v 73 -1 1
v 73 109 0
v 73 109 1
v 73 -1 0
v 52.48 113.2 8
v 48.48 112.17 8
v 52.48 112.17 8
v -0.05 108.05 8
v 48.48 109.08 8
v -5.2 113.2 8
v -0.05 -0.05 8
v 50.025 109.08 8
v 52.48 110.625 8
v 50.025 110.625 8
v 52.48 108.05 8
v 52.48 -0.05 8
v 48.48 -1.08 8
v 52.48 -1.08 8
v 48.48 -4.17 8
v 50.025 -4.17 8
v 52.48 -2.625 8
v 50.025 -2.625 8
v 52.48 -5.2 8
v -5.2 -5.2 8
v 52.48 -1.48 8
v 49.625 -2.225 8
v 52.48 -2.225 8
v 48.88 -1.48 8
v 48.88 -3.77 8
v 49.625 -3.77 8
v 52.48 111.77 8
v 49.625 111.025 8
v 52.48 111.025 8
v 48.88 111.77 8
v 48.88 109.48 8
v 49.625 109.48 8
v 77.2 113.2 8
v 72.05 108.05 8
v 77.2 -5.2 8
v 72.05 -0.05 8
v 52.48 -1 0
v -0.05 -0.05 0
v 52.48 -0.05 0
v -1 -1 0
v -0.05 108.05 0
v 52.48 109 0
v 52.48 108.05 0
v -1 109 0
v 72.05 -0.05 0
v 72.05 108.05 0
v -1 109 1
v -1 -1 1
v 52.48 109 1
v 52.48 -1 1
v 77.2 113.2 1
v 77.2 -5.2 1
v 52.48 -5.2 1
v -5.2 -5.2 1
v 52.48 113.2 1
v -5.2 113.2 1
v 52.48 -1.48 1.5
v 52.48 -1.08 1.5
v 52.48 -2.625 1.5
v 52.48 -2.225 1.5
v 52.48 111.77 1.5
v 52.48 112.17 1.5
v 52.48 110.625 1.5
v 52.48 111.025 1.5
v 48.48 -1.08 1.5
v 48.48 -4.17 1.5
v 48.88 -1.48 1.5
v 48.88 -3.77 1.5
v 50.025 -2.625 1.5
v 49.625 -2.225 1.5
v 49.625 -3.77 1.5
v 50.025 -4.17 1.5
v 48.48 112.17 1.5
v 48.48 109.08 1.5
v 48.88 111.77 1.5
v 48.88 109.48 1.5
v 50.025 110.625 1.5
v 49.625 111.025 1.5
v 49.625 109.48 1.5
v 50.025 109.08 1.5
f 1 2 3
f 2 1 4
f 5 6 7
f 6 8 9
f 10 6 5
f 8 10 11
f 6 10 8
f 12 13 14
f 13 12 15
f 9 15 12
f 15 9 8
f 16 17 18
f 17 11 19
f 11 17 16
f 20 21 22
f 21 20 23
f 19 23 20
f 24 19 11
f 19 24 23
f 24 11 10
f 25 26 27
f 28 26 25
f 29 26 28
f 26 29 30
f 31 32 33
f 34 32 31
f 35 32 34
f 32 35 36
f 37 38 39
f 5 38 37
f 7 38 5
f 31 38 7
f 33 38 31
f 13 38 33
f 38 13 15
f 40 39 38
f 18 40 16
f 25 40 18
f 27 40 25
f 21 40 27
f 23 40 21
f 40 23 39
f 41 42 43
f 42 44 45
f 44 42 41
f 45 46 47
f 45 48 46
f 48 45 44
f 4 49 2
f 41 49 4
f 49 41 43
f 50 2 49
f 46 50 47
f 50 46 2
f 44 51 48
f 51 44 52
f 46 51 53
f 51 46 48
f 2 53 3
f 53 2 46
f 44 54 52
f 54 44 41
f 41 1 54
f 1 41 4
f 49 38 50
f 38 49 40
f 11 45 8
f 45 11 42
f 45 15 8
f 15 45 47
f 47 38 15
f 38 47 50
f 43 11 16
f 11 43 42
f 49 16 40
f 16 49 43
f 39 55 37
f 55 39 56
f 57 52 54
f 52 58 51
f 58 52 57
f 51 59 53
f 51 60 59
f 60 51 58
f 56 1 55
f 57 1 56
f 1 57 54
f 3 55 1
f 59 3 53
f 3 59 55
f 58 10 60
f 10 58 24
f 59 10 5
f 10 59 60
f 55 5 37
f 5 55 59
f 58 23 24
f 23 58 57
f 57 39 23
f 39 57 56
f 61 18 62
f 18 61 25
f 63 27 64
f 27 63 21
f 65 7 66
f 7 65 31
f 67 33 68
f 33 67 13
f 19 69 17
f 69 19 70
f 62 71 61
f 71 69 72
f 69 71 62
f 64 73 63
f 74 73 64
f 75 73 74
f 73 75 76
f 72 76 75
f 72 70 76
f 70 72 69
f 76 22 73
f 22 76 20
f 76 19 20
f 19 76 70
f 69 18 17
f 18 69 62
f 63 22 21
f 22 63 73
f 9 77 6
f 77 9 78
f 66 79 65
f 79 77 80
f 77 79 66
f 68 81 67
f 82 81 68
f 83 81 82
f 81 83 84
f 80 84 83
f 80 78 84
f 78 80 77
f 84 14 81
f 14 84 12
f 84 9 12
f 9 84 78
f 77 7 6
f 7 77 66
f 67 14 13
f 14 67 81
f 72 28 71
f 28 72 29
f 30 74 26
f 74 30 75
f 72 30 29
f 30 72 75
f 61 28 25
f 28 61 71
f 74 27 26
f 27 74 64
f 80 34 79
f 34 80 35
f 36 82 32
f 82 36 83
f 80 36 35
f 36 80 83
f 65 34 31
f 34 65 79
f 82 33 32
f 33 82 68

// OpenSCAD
// Generated by SolidPython 1.0.4 on 2021-01-27 23:57:26


union() {
	difference() {
		difference() {
			difference() {
				union() {
					difference() {
						translate(v = [-1.0000000000, -1.0000000000, 0]) {
							cube(size = [74.0000000000, 110.0000000000, 8]);
						}
						translate(v = [-0.0500000000, -0.0500000000, 0]) {
							cube(size = [72.1000000000, 108.1000000000, 8]);
						}
					}
					translate(v = [0, 0, 1]) {
						difference() {
							translate(v = [-5.2000000000, -5.2000000000, 0]) {
								cube(size = [82.4000000000, 118.4000000000, 7]);
							}
							translate(v = [-1.0000000000, -1.0000000000, 0]) {
								cube(size = [74.0000000000, 110.0000000000, 7]);
							}
						}
					}
				}
				translate(v = [52.4800000000, -5.2000000000, 0]) {
					cube(size = [24.7200000000, 118.4000000000, 8]);
				}
			}
			translate(v = [48.4800000000, -4.1700000000, 0]) {
				translate(v = [0, 0, 1.5000000000]) {
					translate(v = [4, 3.0900000000, 0]) {
						rotate(a = -180) {
							union() {
								translate(v = [2.4550000000, 0, 0]) {
									cube(size = [1.5450000000, 3.0900000000, 6.5000000000]);
								}
								cube(size = [4, 1.5450000000, 6.5000000000]);
							}
						}
					}
				}
			}
		}
		translate(v = [48.4800000000, 109.0800000000, 0]) {
			translate(v = [0, 0, 1.5000000000]) {
				translate(v = [4, 3.0900000000, 0]) {
					rotate(a = -180) {
						union() {
							translate(v = [2.4550000000, 0, 0]) {
								cube(size = [1.5450000000, 3.0900000000, 6.5000000000]);
							}
							cube(size = [4, 1.5450000000, 6.5000000000]);
						}
					}
				}
			}
		}
	}
	union() {
		union() {
			difference() {
				union() {
					difference() {
						translate(v = [-1.0000000000, -1.0000000000, 0]) {
							cube(size = [74.0000000000, 110.0000000000, 8]);
						}
						translate(v = [-0.0500000000, -0.0500000000, 0]) {
							cube(size = [72.1000000000, 108.1000000000, 8]);
						}
					}
					translate(v = [0, 0, 1]) {
						difference() {
							translate(v = [-5.2000000000, -5.2000000000, 0]) {
								cube(size = [82.4000000000, 118.4000000000, 7]);
							}
							translate(v = [-1.0000000000, -1.0000000000, 0]) {
								cube(size = [74.0000000000, 110.0000000000, 7]);
							}
						}
					}
				}
				translate(v = [-5.2000000000, -5.2000000000, 0]) {
					cube(size = [57.6800000000, 118.4000000000, 8]);
				}
			}
			translate(v = [48.4800000000, -4.1700000000, 0]) {
				translate(v = [0.4000000000, 0.4000000000, 0]) {
					translate(v = [0, 0, 1.5000000000]) {
						translate(v = [3.6000000000, 2.2900000000, 0]) {
							rotate(a = -180) {
								union() {
									translate(v = [2.8550000000, 0, 0]) {
										cube(size = [0.7450000000, 2.2900000000, 6.5000000000]);
									}
									cube(size = [3.6000000000, 0.7450000000, 6.5000000000]);
								}
							}
						}
					}
				}
			}
		}
		translate(v = [48.4800000000, 109.0800000000, 0]) {
			translate(v = [0.4000000000, 0.4000000000, 0]) {
				translate(v = [0, 0, 1.5000000000]) {
					translate(v = [3.6000000000, 2.2900000000, 0]) {
						rotate(a = -180) {
							union() {
								translate(v = [2.8550000000, 0, 0]) {
									cube(size = [0.7450000000, 2.2900000000, 6.5000000000]);
								}
								cube(size = [3.6000000000, 0.7450000000, 6.5000000000]);
							}
						}
					}
				}
			}
		}
	}
}
